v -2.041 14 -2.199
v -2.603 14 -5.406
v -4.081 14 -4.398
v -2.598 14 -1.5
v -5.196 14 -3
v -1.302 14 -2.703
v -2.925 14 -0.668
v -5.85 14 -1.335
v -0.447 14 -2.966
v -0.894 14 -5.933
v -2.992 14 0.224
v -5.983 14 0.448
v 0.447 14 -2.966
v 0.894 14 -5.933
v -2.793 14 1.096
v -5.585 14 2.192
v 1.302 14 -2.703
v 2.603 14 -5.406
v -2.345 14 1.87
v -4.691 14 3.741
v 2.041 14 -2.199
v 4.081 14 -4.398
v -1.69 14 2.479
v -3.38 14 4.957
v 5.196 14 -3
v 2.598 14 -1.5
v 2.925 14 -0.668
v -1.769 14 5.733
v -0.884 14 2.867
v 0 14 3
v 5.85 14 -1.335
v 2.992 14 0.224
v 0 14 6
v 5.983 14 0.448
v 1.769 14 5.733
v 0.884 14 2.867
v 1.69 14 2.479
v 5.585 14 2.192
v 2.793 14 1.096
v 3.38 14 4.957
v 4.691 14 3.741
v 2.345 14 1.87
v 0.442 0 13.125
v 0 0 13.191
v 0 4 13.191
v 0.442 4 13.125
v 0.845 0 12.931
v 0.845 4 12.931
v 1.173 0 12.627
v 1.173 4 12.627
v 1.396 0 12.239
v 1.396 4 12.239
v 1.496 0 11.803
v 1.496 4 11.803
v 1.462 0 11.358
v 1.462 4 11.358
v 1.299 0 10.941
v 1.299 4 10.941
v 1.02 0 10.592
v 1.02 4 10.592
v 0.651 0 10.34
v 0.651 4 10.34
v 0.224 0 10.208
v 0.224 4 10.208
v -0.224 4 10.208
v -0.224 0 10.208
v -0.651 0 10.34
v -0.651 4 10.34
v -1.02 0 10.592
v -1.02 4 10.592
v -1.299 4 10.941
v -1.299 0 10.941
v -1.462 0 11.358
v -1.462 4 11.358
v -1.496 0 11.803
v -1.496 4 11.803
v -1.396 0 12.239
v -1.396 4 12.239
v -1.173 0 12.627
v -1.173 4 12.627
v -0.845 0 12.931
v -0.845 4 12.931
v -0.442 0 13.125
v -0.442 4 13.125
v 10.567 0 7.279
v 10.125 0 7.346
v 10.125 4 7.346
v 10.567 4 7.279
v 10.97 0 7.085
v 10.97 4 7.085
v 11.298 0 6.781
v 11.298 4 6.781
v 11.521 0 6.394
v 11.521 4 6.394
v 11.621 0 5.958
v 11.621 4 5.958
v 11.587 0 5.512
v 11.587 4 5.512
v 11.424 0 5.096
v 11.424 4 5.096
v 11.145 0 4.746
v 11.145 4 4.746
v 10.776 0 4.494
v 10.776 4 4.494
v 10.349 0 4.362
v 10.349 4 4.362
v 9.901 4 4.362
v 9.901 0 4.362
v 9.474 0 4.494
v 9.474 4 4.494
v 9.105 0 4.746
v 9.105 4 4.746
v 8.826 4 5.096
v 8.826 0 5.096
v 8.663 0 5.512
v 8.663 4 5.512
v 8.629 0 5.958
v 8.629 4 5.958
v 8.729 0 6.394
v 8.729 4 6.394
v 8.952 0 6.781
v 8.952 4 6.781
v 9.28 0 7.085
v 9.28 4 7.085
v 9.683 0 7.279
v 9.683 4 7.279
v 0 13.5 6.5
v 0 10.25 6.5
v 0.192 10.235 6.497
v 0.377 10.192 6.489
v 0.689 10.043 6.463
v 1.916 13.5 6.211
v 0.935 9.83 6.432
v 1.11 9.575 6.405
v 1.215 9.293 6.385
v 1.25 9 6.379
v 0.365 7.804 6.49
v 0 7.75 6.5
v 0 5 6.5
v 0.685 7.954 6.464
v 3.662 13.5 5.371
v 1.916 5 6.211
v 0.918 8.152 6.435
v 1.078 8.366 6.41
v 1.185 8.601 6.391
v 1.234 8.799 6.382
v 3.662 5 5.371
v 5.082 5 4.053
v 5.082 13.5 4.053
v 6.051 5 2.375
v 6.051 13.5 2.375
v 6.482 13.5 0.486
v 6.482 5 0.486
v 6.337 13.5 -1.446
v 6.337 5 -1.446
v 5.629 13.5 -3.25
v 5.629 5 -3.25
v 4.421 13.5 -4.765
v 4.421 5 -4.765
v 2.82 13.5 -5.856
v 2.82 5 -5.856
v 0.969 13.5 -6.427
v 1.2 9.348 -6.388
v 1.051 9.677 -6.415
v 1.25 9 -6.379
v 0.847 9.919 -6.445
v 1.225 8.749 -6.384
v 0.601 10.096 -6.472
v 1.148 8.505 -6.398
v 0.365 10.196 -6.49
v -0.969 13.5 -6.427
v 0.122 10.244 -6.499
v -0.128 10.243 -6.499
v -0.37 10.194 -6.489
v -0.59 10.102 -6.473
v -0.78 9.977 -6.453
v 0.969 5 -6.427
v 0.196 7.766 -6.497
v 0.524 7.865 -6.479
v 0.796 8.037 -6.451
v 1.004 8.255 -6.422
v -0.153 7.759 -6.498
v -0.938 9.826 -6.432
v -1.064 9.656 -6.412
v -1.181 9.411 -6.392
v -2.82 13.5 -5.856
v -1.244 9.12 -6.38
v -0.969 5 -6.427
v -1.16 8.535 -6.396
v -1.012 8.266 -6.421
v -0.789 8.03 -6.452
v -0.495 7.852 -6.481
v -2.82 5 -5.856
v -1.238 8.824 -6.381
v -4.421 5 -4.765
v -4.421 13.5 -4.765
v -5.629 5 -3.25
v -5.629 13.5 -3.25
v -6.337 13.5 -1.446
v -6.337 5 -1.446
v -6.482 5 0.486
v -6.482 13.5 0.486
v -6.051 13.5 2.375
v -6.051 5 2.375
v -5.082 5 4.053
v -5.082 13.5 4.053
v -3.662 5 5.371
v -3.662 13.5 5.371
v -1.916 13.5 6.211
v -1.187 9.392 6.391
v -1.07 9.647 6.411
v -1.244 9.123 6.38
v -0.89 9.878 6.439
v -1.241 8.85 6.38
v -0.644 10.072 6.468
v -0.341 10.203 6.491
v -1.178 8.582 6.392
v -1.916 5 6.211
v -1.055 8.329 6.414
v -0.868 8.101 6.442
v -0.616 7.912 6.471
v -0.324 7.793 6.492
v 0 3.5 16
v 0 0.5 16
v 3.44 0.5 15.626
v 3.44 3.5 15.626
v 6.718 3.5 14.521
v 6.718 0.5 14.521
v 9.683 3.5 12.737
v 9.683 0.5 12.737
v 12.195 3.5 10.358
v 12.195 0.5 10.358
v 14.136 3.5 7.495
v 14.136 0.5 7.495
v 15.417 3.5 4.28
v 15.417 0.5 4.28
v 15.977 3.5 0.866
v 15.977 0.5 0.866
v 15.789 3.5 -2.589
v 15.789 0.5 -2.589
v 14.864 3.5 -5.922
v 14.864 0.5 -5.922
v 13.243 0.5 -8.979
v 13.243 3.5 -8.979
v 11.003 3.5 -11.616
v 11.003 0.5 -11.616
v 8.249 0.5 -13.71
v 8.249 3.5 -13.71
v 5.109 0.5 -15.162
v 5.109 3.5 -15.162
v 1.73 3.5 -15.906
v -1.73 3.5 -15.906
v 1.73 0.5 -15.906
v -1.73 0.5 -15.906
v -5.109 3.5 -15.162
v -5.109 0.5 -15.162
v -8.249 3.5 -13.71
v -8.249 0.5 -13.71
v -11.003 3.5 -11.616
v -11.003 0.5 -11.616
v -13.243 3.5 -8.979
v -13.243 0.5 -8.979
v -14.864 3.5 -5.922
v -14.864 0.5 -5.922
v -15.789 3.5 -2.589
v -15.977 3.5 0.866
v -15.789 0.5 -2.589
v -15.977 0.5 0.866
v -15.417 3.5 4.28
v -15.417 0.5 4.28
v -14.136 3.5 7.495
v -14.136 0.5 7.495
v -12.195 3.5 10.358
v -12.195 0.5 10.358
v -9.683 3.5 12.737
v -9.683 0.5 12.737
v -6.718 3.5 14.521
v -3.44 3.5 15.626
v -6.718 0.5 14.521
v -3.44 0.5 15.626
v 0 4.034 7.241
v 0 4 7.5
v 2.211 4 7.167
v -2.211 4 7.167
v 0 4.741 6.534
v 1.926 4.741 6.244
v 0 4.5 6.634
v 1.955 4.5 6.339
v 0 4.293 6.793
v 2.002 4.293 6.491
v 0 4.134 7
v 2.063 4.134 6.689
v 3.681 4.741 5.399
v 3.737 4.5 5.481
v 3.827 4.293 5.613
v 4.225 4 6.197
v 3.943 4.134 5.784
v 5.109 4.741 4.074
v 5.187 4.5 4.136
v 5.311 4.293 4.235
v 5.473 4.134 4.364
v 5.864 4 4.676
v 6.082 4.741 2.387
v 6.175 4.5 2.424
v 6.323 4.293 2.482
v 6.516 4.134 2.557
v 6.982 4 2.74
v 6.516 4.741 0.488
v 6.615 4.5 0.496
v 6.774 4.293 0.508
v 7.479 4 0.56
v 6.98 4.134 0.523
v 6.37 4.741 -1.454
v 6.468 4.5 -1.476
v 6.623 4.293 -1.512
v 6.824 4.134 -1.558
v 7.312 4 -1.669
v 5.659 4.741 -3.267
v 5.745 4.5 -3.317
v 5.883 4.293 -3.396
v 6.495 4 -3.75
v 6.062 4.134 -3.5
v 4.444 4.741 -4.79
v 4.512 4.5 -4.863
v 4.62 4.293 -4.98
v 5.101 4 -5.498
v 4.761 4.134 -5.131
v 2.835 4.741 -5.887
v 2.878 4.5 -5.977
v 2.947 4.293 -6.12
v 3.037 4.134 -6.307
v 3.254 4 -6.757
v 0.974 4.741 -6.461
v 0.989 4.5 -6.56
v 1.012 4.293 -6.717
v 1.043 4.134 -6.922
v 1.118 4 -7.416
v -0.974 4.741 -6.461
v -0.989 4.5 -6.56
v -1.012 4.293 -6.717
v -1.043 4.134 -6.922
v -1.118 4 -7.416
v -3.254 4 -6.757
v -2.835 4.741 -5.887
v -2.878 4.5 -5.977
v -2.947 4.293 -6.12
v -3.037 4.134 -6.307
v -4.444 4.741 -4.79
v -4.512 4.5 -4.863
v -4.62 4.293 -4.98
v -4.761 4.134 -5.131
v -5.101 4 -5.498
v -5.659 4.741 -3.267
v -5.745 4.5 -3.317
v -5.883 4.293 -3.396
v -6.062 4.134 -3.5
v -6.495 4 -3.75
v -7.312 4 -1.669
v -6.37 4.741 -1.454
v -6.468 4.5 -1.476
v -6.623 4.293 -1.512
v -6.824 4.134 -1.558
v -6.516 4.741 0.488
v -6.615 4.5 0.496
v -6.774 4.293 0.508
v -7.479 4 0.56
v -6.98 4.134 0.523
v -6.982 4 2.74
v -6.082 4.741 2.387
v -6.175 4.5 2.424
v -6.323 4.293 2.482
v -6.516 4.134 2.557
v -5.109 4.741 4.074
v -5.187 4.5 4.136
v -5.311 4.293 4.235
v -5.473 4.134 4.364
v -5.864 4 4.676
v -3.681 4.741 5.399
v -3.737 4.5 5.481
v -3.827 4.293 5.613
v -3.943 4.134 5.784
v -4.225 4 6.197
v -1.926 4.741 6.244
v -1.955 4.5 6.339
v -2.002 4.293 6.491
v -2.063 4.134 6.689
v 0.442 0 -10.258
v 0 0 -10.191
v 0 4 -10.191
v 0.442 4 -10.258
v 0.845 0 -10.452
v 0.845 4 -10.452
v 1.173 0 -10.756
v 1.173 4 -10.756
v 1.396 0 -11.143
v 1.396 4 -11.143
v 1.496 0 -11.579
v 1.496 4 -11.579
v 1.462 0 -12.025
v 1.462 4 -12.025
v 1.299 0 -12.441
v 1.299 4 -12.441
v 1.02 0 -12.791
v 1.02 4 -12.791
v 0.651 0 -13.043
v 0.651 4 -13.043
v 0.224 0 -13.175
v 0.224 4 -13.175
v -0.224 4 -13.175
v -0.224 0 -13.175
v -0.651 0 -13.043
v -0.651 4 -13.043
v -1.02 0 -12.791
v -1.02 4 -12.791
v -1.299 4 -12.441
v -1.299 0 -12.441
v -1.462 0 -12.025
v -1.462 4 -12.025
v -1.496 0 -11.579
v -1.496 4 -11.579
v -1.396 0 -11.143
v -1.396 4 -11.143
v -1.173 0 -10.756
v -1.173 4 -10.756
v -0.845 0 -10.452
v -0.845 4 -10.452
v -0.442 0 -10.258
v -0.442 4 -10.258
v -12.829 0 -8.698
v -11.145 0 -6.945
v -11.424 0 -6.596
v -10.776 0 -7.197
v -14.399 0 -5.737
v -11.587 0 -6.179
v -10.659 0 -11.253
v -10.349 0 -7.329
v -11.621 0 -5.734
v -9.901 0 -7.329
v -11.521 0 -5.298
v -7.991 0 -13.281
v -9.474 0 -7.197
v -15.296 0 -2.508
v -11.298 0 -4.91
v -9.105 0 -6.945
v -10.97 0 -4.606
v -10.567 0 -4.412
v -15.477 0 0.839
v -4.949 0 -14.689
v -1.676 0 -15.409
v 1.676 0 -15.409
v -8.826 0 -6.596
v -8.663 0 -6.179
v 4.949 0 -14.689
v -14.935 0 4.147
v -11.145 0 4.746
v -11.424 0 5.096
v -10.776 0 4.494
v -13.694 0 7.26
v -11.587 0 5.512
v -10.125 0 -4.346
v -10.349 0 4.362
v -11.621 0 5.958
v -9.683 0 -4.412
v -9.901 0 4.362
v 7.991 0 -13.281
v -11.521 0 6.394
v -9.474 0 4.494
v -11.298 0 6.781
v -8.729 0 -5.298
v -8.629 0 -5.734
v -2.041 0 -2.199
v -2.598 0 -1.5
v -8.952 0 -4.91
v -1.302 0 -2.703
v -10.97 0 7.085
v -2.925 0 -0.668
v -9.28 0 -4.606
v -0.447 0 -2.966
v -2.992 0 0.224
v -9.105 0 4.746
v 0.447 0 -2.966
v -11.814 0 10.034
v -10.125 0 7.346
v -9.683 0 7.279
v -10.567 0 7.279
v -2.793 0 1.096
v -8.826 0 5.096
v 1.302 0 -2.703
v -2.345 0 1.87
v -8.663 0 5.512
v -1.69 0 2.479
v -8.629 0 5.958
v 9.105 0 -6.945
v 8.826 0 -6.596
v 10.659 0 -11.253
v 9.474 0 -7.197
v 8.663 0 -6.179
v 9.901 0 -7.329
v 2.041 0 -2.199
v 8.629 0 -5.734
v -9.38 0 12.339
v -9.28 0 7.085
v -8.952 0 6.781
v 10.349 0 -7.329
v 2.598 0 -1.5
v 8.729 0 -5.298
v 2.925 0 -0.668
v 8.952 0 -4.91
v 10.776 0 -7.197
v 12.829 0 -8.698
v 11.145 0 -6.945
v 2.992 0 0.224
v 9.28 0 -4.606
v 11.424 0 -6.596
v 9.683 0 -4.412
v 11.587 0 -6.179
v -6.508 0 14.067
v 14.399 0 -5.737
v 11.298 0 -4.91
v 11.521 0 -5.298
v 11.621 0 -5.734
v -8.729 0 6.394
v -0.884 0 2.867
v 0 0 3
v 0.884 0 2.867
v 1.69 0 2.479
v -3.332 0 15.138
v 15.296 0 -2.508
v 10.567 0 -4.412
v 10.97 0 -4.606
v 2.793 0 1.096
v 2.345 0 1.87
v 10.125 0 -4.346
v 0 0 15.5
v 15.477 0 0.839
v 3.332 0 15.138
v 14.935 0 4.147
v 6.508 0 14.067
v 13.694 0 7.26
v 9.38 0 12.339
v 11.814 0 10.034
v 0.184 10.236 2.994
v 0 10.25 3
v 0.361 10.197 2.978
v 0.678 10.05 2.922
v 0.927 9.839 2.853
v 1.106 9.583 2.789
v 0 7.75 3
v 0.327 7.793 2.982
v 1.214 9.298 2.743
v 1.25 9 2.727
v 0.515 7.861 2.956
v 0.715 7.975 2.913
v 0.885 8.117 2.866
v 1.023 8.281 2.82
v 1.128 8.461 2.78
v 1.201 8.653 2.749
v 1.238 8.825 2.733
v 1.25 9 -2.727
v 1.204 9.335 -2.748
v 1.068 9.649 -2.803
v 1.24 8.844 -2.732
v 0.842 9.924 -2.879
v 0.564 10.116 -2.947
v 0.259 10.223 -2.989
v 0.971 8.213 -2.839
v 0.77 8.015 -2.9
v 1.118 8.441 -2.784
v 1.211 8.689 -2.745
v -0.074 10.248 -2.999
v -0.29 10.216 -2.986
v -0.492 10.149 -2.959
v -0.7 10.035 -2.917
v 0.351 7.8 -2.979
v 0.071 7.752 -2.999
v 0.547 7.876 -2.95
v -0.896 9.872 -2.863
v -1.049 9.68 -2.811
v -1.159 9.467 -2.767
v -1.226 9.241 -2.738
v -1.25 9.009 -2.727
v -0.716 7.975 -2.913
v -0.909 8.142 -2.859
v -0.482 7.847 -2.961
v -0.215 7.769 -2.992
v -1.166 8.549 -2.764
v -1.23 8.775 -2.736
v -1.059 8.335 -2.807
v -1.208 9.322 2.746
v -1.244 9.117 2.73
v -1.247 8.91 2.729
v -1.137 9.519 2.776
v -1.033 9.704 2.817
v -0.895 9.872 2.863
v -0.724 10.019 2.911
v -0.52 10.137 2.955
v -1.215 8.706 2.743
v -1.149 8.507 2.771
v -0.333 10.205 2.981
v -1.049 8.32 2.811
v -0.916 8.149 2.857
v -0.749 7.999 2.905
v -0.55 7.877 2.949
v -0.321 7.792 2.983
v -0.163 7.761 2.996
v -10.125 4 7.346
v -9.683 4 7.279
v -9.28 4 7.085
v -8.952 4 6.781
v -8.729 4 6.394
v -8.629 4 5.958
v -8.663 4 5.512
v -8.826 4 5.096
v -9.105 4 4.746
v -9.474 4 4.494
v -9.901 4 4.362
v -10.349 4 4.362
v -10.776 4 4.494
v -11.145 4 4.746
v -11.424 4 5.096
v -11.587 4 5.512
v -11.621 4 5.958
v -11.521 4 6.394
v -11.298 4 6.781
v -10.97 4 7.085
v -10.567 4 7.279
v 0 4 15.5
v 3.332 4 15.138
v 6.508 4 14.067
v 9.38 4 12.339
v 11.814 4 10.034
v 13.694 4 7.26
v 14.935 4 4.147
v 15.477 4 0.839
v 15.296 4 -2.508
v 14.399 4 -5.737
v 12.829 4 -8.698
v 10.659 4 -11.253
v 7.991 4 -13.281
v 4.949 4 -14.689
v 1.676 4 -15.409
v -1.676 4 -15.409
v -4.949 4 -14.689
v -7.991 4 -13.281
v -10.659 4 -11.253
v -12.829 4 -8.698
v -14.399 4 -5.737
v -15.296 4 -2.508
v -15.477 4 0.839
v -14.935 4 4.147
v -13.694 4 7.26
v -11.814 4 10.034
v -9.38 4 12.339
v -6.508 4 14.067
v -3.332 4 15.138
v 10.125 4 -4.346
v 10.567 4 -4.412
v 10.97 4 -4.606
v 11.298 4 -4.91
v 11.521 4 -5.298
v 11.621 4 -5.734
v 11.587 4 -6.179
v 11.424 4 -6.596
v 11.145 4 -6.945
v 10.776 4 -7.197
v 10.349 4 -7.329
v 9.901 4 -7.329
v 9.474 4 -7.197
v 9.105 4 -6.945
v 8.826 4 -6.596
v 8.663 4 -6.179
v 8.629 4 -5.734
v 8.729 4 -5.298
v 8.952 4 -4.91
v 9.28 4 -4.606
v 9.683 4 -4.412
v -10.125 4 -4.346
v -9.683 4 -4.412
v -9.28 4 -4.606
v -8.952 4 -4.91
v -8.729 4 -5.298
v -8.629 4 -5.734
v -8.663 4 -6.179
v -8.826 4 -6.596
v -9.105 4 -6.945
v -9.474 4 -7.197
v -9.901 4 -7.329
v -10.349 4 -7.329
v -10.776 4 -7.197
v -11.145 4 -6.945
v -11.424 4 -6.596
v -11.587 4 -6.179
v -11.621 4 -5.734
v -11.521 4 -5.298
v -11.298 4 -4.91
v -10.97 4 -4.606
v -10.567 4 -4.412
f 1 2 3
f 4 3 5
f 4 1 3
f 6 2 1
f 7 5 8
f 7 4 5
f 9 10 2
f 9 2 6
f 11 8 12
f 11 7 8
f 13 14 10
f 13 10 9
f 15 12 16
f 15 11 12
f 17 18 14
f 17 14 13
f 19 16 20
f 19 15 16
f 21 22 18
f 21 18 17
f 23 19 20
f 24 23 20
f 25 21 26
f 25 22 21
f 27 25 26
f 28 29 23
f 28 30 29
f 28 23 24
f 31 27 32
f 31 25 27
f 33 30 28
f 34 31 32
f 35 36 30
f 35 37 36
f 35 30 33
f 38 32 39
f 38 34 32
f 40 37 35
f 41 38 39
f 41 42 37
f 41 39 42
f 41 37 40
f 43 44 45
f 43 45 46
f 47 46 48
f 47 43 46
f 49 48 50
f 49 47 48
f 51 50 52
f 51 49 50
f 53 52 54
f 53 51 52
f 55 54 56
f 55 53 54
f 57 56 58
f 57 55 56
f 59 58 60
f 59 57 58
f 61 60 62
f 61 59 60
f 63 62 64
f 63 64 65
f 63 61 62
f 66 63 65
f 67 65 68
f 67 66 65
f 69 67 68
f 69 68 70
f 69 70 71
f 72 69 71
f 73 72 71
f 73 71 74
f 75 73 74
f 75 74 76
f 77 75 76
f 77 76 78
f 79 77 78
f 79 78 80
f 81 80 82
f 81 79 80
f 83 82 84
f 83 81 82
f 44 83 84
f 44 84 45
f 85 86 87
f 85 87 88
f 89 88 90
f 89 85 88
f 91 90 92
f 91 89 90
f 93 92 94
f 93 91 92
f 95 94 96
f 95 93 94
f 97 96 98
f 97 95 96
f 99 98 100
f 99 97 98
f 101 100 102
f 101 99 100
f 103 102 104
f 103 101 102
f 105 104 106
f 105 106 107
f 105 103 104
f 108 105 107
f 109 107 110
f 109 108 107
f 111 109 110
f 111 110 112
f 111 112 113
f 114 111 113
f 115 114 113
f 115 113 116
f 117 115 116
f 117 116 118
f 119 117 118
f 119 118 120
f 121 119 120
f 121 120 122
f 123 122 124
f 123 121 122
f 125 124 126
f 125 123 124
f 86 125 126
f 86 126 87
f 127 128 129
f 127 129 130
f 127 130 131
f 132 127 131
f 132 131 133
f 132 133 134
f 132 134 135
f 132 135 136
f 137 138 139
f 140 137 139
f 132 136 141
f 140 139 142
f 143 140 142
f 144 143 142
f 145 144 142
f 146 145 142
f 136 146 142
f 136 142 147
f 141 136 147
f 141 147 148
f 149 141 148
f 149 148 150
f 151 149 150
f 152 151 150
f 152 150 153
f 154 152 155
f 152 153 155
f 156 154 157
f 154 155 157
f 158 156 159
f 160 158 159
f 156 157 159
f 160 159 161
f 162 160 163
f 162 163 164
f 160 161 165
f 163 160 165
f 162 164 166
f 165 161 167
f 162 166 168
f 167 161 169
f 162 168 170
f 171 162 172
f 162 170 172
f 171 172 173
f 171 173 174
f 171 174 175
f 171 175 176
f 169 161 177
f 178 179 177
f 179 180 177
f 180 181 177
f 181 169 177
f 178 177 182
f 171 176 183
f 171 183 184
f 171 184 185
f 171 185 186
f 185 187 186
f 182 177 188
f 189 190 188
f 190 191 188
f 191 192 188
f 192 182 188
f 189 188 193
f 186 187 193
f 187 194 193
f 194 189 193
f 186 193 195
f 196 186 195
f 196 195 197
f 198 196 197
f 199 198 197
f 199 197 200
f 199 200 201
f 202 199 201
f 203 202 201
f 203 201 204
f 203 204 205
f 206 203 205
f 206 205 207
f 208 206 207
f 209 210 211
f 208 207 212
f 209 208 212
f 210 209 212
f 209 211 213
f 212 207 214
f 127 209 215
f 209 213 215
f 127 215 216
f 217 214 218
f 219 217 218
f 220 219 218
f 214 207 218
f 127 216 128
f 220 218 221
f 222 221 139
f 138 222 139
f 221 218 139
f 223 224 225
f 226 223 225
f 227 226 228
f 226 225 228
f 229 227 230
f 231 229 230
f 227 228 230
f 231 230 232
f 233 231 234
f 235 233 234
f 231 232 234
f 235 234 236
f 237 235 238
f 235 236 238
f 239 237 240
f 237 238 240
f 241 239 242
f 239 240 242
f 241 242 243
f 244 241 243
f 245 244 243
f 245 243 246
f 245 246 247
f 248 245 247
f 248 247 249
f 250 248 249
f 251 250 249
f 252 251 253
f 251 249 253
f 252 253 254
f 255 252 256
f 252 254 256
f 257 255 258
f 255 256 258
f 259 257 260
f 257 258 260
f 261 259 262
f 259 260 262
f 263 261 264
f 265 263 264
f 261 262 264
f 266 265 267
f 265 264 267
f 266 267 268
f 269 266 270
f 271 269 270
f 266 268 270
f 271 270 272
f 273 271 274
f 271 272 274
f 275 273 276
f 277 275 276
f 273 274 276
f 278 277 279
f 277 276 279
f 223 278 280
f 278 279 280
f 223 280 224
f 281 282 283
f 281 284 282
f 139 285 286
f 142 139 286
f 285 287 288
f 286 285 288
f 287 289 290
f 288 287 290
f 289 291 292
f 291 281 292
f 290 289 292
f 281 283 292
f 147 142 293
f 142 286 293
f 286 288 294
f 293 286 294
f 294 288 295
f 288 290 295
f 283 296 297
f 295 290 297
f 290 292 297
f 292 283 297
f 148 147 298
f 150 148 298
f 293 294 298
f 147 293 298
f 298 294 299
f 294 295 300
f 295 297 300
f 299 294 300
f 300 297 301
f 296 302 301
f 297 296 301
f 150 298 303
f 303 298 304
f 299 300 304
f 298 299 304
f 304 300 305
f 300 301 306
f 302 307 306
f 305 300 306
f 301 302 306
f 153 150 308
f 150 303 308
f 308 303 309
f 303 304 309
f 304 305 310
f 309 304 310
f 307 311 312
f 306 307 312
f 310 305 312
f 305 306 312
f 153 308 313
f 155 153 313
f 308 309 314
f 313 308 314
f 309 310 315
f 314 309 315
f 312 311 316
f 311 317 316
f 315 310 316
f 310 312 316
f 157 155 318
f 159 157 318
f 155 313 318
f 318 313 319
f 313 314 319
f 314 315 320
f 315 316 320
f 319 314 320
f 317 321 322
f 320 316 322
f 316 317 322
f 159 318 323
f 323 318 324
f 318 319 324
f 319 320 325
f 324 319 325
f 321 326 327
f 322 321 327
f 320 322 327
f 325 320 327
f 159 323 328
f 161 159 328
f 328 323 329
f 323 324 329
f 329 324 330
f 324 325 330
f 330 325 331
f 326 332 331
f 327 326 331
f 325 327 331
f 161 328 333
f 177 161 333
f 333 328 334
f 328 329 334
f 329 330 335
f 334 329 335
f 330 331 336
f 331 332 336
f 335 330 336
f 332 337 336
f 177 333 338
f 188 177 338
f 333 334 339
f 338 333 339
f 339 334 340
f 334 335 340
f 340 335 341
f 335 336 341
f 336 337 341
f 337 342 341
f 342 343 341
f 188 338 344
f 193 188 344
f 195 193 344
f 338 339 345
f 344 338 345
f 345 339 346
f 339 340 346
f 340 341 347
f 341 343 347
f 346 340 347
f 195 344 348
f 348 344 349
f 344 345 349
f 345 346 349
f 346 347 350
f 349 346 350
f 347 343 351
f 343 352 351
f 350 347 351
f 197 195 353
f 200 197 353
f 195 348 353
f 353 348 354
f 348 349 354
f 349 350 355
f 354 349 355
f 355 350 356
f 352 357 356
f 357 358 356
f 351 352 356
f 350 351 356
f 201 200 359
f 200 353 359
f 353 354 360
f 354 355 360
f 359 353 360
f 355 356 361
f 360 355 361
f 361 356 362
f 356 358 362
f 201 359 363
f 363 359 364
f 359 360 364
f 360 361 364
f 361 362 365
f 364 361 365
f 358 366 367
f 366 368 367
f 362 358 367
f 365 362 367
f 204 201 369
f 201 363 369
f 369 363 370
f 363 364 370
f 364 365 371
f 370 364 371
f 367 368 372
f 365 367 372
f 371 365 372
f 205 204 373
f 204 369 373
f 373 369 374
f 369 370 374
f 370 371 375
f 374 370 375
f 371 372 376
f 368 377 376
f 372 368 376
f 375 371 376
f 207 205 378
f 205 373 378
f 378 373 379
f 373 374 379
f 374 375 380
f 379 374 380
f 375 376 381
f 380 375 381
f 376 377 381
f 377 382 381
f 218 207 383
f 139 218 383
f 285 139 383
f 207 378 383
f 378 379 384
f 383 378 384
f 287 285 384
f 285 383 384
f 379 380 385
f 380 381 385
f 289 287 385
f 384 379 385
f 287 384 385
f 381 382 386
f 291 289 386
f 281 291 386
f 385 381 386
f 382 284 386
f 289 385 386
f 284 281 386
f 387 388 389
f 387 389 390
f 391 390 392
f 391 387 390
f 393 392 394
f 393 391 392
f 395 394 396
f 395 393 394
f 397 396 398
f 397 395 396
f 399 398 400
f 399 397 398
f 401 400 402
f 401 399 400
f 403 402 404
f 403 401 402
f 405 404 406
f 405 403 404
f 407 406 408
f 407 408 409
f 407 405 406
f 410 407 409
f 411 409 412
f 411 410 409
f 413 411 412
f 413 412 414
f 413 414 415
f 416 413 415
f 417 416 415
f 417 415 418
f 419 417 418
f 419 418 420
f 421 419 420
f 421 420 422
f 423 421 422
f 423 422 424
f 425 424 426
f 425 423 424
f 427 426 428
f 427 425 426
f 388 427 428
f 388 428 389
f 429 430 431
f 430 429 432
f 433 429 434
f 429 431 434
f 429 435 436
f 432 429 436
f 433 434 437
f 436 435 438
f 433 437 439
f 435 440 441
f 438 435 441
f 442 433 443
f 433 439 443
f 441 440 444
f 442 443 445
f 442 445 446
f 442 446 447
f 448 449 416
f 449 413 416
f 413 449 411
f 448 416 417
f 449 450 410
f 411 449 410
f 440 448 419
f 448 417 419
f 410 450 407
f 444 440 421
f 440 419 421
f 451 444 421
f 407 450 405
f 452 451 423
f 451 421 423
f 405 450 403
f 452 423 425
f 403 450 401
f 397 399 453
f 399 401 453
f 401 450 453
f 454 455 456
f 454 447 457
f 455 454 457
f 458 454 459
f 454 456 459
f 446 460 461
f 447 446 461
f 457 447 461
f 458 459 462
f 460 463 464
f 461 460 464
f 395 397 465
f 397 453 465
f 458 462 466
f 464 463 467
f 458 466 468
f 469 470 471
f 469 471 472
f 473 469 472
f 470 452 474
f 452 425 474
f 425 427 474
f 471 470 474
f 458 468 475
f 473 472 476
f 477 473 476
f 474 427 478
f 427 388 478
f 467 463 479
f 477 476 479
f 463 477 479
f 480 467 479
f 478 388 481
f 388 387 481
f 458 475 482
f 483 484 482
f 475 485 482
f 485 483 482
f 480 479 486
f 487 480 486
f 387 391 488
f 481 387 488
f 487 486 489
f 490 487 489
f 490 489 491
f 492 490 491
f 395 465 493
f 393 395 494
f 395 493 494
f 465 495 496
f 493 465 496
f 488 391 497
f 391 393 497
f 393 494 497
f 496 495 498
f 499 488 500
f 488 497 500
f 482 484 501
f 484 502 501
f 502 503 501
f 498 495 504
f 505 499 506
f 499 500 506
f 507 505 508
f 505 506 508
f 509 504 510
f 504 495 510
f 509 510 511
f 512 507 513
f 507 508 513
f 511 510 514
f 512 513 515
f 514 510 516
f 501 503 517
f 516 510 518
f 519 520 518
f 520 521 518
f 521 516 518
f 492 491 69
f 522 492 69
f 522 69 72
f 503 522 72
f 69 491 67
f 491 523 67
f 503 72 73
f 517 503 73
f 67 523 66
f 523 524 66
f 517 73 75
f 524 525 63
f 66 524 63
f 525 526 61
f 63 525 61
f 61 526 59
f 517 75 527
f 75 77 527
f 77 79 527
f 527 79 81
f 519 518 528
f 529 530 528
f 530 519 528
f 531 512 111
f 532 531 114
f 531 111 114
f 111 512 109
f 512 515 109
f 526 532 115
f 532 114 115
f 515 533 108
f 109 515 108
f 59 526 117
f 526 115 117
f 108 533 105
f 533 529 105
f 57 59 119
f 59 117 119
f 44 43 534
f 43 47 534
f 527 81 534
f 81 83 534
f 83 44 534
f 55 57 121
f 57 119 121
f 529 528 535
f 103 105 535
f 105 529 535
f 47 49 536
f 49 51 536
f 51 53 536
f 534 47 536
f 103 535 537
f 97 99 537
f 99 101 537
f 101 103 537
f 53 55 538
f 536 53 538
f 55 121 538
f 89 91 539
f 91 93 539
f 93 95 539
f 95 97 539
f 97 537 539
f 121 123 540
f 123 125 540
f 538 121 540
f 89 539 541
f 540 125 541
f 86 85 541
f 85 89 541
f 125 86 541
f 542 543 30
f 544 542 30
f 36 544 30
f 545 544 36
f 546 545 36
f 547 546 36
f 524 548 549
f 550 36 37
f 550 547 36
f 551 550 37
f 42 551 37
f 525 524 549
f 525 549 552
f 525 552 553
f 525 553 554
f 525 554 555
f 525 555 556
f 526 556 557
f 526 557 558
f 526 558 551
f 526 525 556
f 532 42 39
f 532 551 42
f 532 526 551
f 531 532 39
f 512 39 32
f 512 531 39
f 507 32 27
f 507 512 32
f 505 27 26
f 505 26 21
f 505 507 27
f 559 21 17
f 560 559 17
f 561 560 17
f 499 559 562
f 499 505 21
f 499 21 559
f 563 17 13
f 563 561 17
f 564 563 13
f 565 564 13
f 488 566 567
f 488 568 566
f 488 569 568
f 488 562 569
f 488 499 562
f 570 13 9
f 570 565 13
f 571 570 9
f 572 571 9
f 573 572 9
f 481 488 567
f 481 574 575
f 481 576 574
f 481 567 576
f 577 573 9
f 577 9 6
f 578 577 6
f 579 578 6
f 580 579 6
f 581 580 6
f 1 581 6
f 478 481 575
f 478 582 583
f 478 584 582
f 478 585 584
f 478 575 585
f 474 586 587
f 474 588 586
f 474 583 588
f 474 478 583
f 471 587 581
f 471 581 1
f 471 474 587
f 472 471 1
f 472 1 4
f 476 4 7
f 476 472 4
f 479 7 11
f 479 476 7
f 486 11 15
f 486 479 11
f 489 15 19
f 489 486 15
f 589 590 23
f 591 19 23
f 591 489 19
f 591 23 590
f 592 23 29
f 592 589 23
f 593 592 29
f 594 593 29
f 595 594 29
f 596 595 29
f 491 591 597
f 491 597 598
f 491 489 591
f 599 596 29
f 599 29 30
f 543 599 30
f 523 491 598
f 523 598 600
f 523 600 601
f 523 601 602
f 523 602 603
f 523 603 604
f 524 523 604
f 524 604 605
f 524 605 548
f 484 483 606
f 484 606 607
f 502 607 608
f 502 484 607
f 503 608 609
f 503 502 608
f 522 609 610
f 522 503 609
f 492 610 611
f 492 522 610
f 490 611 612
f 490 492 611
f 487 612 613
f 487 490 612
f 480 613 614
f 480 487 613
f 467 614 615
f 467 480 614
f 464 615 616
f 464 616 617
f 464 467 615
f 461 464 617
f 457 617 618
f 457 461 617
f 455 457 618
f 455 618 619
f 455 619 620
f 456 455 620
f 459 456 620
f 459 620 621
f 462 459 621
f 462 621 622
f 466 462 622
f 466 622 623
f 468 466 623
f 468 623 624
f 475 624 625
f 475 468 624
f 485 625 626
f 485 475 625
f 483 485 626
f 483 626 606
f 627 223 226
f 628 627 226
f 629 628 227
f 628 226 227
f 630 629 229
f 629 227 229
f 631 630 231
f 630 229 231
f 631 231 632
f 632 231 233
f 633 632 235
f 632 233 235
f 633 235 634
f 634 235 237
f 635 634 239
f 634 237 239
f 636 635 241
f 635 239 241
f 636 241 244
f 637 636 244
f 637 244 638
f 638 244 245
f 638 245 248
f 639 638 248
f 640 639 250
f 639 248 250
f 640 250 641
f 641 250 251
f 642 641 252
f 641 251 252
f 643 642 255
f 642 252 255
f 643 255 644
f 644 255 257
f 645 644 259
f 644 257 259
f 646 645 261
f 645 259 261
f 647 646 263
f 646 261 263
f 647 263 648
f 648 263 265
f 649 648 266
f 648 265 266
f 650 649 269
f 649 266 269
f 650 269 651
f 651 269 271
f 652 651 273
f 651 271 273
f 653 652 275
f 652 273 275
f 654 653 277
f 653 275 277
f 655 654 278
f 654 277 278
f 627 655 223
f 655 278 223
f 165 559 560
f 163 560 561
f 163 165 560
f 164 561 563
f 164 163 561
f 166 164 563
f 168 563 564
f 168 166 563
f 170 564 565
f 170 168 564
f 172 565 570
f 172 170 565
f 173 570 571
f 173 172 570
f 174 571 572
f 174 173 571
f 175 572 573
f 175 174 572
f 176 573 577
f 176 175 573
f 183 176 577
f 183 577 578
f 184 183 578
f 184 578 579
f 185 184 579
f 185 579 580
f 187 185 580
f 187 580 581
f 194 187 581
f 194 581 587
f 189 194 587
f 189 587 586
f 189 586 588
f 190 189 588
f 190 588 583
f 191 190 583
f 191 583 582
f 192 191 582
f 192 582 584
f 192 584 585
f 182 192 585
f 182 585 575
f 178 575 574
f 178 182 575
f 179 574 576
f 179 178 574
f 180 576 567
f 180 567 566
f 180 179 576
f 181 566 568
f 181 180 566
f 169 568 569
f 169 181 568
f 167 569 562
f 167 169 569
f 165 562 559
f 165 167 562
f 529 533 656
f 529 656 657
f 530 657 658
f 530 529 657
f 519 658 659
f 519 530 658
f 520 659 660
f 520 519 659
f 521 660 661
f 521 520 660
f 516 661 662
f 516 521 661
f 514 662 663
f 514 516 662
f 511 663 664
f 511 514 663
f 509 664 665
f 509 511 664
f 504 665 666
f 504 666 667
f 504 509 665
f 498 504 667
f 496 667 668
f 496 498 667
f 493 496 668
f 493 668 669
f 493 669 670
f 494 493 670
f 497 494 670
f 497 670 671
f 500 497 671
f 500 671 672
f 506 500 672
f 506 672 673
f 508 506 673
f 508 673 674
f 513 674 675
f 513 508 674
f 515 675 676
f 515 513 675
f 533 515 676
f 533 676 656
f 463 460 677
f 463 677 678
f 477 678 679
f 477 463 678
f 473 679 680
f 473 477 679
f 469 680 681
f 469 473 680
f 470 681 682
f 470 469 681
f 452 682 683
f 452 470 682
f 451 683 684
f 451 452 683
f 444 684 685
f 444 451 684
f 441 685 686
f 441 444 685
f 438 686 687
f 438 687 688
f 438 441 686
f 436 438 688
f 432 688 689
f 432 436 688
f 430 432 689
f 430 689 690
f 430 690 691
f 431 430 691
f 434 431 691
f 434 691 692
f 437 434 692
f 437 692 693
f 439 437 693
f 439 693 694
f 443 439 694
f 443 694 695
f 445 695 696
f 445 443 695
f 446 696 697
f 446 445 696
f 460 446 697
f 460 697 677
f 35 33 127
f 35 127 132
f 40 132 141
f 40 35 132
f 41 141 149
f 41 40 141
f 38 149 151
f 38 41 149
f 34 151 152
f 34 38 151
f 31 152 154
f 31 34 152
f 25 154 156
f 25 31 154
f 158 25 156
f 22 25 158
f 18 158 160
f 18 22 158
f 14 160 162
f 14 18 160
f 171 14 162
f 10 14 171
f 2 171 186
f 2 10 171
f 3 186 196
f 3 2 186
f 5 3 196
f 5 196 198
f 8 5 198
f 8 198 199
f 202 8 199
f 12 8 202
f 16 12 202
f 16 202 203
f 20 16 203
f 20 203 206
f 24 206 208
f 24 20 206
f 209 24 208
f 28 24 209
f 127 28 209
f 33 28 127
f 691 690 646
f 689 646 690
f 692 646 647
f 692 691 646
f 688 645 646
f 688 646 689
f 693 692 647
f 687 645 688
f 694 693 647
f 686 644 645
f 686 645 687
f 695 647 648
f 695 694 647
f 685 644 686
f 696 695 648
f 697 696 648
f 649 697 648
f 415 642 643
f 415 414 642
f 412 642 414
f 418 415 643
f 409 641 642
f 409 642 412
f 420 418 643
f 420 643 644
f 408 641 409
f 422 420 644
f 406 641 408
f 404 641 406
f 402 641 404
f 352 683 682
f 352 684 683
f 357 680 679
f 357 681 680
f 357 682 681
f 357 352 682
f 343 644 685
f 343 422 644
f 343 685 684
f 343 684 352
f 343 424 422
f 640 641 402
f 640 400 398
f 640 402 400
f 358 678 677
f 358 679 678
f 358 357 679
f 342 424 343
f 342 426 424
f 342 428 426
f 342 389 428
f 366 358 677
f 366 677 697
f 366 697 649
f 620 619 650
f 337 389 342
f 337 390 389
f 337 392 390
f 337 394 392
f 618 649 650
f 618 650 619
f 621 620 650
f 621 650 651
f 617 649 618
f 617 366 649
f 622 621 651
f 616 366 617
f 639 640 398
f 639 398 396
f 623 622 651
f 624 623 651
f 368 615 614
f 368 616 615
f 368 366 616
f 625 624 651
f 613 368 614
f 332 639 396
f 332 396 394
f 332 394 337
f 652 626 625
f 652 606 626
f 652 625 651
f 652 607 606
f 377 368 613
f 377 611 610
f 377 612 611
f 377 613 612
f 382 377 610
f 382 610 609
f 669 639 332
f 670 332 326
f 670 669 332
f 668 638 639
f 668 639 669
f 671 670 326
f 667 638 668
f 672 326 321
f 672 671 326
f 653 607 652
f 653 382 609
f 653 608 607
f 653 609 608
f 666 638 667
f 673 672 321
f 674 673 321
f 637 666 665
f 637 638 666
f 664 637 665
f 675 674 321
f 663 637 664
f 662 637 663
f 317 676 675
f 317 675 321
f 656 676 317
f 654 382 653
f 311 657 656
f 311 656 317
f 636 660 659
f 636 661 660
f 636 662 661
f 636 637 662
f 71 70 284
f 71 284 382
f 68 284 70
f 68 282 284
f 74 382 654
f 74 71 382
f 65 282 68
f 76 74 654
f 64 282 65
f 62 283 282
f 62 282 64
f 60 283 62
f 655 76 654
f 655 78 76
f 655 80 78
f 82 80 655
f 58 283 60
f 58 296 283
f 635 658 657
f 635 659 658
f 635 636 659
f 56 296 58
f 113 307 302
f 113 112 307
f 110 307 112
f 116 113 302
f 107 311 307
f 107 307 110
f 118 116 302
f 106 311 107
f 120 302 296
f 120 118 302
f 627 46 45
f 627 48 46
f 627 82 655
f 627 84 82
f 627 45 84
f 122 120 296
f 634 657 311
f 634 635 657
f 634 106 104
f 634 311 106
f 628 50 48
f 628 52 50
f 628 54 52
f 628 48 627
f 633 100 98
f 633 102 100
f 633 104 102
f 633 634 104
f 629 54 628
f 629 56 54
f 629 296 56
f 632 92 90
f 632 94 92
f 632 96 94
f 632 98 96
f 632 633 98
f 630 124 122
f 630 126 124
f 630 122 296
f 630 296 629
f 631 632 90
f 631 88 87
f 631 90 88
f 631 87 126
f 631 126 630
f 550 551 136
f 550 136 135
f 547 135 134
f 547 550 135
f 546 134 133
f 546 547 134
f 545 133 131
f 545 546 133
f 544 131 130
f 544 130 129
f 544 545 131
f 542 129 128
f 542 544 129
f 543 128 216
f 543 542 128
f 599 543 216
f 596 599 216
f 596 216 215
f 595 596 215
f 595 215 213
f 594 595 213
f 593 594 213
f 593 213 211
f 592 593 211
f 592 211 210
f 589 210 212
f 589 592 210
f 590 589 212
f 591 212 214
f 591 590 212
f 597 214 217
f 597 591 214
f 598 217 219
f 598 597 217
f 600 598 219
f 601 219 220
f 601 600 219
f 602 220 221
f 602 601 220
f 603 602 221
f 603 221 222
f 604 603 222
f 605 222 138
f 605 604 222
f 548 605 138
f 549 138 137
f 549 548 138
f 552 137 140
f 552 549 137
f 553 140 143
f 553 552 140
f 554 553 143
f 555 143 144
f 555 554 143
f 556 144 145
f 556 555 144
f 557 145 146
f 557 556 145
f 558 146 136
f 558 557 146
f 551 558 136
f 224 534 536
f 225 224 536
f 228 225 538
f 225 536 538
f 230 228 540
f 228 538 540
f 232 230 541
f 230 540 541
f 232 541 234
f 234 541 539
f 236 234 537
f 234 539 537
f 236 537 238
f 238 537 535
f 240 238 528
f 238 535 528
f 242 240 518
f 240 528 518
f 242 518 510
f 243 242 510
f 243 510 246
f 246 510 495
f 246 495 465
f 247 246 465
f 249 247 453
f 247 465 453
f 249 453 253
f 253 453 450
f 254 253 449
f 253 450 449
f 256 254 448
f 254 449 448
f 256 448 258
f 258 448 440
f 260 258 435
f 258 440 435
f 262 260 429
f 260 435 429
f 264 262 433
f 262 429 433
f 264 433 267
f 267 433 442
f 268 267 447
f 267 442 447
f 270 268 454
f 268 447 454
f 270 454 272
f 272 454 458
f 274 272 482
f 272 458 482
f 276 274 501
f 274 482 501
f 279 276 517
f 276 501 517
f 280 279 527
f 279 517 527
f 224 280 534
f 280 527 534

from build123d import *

# Parameters (mm, degrees)
SKETCH1_R               = 16
SKETCH1_R_2             = 1.5
SKETCH1_R_3             = 3
BOSS_EXTRUDE1_DEPTH     = 4
SKETCH2_R               = 6.5
SKETCH2_R_2             = 3
BOSS_EXTRUDE2_DEPTH     = 10
FILLET1_R               = 1
CUT_EXTRUDE1_DEPTH      = 27.608269391
CUT_EXTRUDE1_DEPTH_BACK = 27.608269391
SKETCH3_R               = 1.25
CHAMFER1_SIZE           = 0.5


with BuildPart() as part:
    # Sketch1 → Boss-Extrude1 (new body)
    with BuildSketch(Plane(origin=(0, 0, 0), x_dir=(1, 0, 0), z_dir=(0, 1, 0))):
        with Locations(Location((0, 0, 0), (0, 0, 270))):
            Circle(SKETCH1_R)
        with Locations(Location((0, 11.691342951, 0), (0, 0, 270))):
            Circle(SKETCH1_R_2, mode=Mode.SUBTRACT)
        with Locations(Location((10.125, 5.845671476, 0), (0, 0, 270))):
            Circle(SKETCH1_R_2, mode=Mode.SUBTRACT)
        with Locations(Location((10.125, -5.845671476, 0), (0, 0, 270))):
            Circle(SKETCH1_R_2, mode=Mode.SUBTRACT)
        with Locations(Location((0, -11.691342951, 0), (0, 0, 270))):
            Circle(SKETCH1_R_2, mode=Mode.SUBTRACT)
        with Locations(Location((-10.125, -5.845671476, 0), (0, 0, 270))):
            Circle(SKETCH1_R_2, mode=Mode.SUBTRACT)
        with Locations(Location((-10.125, 5.845671476, 0), (0, 0, 270))):
            Circle(SKETCH1_R_2, mode=Mode.SUBTRACT)
        with Locations(Location((0, 0, 0), (0, 0, 270))):
            Circle(SKETCH1_R_3, mode=Mode.SUBTRACT)
    extrude(amount=BOSS_EXTRUDE1_DEPTH)

    # Sketch2 → Boss-Extrude2 (add)
    with BuildSketch(Plane(origin=(0, 4, 0), x_dir=(1, 0, 0), z_dir=(0, 1, 0))):
        with Locations(Location((0, 0, 0), (0, 0, 270))):
            Circle(SKETCH2_R)
        with Locations(Location((0, 0, 0), (0, 0, 270))):
            Circle(SKETCH2_R_2, mode=Mode.SUBTRACT)
    extrude(amount=BOSS_EXTRUDE2_DEPTH)

    # Fillet1
    fillet1_edges = [part.edges().sort_by_distance(p)[0] for p in [
        (0, 4, -6.5),
    ]]
    fillet(fillet1_edges, radius=FILLET1_R)

    # Sketch3 → Cut-Extrude1 (cut, two sides: drawn at the far end of the back side and taken through both)
    with BuildSketch(Plane.XY.offset(-CUT_EXTRUDE1_DEPTH_BACK)):
        with Locations((0, 9)):
            Circle(SKETCH3_R)
    extrude(amount=CUT_EXTRUDE1_DEPTH + CUT_EXTRUDE1_DEPTH_BACK, mode=Mode.SUBTRACT)

    # Chamfer1
    chamfer1_edges = [part.edges().sort_by_distance(p)[0] for p in [
        (0, 0, -16),
        (0, 14, -6.5),
        (0, 4, -16),
    ]]
    chamfer(chamfer1_edges, length=CHAMFER1_SIZE)


solid = part.part
